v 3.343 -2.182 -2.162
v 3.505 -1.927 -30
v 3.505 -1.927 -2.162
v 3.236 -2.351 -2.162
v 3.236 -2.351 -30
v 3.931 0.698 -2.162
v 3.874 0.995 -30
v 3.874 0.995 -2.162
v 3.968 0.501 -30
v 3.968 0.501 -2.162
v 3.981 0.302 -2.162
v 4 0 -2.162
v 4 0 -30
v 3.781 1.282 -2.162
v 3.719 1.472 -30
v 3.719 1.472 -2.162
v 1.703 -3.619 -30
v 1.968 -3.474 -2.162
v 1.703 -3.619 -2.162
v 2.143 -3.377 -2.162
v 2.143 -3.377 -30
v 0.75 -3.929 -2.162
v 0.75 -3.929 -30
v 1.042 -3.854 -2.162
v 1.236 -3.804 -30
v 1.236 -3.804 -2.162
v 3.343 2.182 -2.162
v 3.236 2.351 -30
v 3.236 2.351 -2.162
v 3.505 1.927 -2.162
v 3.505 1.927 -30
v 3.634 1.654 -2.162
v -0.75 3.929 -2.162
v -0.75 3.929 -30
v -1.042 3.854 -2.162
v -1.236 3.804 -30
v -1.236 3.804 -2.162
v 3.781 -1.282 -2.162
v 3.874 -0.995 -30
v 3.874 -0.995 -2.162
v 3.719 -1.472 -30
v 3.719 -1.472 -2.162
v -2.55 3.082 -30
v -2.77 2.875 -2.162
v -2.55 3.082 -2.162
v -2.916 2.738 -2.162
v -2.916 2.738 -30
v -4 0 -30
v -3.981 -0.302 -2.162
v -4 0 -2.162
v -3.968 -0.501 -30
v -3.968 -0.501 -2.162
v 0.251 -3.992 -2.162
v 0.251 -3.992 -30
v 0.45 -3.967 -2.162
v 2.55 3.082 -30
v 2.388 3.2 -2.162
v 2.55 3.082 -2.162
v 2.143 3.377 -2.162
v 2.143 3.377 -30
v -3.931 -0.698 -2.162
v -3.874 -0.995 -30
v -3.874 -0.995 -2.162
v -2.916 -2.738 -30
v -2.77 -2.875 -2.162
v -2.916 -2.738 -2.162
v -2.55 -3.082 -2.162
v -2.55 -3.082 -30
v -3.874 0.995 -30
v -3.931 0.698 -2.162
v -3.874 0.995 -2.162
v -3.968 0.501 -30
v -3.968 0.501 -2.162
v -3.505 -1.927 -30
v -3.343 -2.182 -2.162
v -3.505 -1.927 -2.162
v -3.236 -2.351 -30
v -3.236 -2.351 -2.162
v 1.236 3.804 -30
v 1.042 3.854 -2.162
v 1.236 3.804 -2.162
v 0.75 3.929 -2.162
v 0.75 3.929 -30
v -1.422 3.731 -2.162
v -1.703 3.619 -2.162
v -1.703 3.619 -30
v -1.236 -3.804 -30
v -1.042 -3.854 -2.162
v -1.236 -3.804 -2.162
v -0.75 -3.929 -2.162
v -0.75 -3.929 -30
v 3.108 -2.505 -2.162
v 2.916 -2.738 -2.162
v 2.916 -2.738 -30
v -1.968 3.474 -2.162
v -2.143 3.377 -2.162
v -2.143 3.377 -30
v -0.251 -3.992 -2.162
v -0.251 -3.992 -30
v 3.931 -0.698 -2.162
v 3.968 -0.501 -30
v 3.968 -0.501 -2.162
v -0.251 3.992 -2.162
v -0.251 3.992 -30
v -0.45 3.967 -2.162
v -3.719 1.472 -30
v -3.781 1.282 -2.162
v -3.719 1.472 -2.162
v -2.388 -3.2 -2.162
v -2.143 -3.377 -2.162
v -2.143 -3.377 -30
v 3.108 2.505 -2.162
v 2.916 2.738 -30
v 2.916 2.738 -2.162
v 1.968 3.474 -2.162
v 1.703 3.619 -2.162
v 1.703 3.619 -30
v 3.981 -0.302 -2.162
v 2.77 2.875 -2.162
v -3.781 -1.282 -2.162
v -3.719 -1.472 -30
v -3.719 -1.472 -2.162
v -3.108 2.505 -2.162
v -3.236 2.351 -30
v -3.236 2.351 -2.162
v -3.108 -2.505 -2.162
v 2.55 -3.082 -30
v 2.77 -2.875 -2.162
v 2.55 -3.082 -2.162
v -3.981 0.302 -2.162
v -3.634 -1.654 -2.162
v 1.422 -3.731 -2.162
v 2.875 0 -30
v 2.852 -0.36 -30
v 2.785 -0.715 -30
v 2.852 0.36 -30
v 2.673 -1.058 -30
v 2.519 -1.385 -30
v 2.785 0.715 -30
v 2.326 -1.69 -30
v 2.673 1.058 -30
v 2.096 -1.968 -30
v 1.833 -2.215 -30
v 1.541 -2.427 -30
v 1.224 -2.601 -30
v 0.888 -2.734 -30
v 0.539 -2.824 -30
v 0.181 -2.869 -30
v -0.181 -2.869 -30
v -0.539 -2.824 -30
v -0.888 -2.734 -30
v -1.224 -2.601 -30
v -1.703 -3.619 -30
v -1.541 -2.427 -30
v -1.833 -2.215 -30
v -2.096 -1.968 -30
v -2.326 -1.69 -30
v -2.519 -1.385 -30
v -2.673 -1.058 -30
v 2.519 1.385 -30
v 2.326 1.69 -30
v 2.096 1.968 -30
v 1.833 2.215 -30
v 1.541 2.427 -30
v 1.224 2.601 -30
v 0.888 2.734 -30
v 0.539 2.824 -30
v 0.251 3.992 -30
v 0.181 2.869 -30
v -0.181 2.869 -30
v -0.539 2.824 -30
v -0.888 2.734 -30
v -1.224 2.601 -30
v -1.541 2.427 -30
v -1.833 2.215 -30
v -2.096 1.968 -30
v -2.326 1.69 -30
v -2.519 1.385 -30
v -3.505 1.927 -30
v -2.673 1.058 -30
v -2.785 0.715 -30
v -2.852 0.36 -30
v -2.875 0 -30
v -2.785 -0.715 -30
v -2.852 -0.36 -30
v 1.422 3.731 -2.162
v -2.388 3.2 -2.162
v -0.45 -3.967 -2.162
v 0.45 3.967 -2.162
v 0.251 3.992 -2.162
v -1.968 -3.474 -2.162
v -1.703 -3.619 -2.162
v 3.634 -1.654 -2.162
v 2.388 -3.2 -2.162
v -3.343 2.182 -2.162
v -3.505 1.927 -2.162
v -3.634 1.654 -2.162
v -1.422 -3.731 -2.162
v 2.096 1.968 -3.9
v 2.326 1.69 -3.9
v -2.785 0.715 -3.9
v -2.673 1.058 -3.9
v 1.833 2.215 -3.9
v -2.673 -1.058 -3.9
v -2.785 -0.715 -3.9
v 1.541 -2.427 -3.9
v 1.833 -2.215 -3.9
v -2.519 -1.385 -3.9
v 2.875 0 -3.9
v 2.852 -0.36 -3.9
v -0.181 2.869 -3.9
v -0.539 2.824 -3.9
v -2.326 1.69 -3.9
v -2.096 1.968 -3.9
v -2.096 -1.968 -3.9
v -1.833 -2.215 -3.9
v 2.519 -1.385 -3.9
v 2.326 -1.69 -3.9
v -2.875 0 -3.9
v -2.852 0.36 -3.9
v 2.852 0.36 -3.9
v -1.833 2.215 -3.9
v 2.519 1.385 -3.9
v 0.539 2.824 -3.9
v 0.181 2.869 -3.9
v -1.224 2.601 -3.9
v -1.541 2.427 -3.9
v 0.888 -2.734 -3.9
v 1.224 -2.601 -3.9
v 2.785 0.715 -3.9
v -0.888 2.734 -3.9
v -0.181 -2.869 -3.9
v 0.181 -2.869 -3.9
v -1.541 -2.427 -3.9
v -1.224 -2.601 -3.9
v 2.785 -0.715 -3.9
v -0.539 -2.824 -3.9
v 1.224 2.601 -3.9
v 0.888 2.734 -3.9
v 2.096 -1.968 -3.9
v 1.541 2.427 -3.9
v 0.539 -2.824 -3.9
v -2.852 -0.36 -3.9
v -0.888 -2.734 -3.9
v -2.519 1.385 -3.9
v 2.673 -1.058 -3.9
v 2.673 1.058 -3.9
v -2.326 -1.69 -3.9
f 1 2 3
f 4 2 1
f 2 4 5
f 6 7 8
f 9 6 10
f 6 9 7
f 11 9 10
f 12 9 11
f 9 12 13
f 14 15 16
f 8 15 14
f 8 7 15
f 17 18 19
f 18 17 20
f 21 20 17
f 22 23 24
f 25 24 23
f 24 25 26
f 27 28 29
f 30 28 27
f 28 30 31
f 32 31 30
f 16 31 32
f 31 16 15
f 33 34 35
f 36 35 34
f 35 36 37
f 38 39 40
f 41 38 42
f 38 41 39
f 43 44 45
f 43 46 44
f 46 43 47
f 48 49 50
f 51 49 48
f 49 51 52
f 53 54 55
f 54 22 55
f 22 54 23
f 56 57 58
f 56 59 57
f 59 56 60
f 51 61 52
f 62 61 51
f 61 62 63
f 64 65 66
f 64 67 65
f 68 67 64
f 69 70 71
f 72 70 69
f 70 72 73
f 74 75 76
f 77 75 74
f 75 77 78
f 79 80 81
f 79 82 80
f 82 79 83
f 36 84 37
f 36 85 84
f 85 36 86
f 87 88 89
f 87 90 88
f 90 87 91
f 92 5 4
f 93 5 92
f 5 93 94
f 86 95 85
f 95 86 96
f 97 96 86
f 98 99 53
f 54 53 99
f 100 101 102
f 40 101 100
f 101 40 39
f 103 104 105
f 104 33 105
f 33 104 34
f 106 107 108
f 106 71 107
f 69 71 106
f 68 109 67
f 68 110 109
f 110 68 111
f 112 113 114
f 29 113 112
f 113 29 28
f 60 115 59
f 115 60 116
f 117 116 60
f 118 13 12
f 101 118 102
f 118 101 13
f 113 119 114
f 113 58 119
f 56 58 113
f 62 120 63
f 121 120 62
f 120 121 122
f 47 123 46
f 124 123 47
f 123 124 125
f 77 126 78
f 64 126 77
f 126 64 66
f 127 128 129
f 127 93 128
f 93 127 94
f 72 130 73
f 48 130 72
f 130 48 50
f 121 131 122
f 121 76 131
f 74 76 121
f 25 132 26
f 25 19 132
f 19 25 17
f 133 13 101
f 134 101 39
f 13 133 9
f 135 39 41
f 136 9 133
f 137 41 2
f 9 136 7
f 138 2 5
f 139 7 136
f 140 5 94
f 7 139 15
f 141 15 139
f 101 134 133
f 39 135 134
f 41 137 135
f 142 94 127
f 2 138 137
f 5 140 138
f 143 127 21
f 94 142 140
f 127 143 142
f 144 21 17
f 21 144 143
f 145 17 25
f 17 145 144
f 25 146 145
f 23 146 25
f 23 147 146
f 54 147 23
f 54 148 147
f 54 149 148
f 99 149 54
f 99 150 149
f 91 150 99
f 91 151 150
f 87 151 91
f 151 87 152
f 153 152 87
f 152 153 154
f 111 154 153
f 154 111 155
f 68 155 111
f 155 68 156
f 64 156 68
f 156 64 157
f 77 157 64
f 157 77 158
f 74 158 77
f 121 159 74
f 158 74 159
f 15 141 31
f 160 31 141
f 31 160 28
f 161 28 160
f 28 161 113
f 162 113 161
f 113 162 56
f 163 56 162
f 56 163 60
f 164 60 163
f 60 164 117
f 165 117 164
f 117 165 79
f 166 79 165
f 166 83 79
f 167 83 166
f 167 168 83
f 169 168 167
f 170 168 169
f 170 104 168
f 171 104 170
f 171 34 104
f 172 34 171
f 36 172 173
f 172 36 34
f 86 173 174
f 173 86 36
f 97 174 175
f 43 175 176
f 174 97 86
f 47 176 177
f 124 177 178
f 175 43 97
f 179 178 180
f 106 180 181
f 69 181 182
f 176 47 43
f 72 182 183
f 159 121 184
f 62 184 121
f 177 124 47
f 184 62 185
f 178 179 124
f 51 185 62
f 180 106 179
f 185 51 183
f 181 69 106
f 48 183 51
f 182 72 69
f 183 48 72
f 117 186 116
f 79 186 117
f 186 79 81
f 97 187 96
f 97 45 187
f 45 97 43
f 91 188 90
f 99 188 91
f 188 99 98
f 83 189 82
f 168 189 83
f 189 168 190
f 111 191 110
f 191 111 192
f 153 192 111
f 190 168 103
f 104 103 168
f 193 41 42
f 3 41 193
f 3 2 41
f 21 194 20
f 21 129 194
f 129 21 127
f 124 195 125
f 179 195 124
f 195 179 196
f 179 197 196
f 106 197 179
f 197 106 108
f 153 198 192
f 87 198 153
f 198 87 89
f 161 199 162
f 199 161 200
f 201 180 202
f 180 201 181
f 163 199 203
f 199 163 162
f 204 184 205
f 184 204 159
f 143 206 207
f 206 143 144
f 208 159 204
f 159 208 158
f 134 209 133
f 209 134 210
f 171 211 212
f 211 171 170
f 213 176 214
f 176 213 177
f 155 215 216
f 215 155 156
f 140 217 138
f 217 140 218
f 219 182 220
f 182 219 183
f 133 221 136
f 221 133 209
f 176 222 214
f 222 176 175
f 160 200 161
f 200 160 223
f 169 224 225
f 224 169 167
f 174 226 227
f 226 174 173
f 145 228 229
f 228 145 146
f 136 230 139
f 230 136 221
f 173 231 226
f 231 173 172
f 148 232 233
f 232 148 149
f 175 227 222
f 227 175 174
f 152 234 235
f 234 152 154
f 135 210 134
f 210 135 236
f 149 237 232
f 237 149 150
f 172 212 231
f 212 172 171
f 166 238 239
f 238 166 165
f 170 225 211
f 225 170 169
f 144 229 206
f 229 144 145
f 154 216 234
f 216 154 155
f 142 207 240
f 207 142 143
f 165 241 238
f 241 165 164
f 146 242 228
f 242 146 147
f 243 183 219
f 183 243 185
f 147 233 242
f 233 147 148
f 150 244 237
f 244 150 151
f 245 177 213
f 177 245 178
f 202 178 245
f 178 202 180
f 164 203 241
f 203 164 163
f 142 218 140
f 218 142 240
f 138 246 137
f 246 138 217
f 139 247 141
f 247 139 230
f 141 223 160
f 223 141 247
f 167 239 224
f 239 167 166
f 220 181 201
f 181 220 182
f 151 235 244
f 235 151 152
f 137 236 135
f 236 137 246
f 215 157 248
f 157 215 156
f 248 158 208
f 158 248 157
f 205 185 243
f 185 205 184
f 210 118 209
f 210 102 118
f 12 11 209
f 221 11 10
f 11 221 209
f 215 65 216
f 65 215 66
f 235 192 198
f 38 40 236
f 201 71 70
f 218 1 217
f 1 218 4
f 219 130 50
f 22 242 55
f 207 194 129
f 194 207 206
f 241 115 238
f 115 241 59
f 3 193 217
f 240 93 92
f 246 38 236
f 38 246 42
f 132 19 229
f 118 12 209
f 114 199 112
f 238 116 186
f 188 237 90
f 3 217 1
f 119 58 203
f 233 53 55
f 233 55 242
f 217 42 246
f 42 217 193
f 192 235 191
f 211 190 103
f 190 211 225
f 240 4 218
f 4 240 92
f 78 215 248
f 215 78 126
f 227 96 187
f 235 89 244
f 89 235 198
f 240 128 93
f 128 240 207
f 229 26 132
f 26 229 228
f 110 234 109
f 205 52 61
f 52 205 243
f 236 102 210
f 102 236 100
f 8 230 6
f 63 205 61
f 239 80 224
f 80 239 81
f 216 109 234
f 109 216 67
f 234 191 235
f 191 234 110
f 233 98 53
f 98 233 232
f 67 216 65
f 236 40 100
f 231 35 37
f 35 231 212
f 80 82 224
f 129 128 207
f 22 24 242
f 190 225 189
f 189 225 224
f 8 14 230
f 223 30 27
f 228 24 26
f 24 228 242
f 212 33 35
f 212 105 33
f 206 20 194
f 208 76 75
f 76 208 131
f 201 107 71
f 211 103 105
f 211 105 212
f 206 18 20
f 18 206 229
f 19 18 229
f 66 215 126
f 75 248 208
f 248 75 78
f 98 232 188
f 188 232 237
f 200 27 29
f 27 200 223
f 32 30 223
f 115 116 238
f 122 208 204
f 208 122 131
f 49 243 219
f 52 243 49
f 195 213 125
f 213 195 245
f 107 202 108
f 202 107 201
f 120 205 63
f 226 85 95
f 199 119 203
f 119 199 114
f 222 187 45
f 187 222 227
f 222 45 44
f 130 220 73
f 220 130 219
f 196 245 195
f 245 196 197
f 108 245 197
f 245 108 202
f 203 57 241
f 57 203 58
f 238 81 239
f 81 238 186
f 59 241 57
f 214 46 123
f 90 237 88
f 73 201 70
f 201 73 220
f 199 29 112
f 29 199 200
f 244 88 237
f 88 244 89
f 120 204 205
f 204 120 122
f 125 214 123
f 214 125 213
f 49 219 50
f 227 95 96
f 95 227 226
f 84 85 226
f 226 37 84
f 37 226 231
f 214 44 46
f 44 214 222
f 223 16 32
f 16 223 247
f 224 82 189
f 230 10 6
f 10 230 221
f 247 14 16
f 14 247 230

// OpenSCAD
$fn = 50;

difference() {
	union() {
		translate(v = [0, 0, -30.0]) {
			cylinder(h = 30, r = 4.0);
		}
		#translate(v = [0, 0, -33.0]) {
			cylinder(h = 33, r = 2.875);
		}
	}
	union() {
		translate(v = [0, 0, 0]) {
			rotate(a = [0, 0, 0]) {
				difference() {
					union() {
						translate(v = [0, 0, -33.0]) {
							cylinder(h = 33, r = 2.6);
						}
						translate(v = [0, 0, -3.9]) {
							cylinder(h = 3.9, r1 = 2.875, r2 = 5.4);
						}
						translate(v = [0, 0, -33.0]) {
							cylinder(h = 33, r = 2.875);
						}
						translate(v = [0, 0, -33.0]) {
							cylinder(h = 33, r = 2.6);
						}
					}
					union();
				}
			}
		}
	}
}
